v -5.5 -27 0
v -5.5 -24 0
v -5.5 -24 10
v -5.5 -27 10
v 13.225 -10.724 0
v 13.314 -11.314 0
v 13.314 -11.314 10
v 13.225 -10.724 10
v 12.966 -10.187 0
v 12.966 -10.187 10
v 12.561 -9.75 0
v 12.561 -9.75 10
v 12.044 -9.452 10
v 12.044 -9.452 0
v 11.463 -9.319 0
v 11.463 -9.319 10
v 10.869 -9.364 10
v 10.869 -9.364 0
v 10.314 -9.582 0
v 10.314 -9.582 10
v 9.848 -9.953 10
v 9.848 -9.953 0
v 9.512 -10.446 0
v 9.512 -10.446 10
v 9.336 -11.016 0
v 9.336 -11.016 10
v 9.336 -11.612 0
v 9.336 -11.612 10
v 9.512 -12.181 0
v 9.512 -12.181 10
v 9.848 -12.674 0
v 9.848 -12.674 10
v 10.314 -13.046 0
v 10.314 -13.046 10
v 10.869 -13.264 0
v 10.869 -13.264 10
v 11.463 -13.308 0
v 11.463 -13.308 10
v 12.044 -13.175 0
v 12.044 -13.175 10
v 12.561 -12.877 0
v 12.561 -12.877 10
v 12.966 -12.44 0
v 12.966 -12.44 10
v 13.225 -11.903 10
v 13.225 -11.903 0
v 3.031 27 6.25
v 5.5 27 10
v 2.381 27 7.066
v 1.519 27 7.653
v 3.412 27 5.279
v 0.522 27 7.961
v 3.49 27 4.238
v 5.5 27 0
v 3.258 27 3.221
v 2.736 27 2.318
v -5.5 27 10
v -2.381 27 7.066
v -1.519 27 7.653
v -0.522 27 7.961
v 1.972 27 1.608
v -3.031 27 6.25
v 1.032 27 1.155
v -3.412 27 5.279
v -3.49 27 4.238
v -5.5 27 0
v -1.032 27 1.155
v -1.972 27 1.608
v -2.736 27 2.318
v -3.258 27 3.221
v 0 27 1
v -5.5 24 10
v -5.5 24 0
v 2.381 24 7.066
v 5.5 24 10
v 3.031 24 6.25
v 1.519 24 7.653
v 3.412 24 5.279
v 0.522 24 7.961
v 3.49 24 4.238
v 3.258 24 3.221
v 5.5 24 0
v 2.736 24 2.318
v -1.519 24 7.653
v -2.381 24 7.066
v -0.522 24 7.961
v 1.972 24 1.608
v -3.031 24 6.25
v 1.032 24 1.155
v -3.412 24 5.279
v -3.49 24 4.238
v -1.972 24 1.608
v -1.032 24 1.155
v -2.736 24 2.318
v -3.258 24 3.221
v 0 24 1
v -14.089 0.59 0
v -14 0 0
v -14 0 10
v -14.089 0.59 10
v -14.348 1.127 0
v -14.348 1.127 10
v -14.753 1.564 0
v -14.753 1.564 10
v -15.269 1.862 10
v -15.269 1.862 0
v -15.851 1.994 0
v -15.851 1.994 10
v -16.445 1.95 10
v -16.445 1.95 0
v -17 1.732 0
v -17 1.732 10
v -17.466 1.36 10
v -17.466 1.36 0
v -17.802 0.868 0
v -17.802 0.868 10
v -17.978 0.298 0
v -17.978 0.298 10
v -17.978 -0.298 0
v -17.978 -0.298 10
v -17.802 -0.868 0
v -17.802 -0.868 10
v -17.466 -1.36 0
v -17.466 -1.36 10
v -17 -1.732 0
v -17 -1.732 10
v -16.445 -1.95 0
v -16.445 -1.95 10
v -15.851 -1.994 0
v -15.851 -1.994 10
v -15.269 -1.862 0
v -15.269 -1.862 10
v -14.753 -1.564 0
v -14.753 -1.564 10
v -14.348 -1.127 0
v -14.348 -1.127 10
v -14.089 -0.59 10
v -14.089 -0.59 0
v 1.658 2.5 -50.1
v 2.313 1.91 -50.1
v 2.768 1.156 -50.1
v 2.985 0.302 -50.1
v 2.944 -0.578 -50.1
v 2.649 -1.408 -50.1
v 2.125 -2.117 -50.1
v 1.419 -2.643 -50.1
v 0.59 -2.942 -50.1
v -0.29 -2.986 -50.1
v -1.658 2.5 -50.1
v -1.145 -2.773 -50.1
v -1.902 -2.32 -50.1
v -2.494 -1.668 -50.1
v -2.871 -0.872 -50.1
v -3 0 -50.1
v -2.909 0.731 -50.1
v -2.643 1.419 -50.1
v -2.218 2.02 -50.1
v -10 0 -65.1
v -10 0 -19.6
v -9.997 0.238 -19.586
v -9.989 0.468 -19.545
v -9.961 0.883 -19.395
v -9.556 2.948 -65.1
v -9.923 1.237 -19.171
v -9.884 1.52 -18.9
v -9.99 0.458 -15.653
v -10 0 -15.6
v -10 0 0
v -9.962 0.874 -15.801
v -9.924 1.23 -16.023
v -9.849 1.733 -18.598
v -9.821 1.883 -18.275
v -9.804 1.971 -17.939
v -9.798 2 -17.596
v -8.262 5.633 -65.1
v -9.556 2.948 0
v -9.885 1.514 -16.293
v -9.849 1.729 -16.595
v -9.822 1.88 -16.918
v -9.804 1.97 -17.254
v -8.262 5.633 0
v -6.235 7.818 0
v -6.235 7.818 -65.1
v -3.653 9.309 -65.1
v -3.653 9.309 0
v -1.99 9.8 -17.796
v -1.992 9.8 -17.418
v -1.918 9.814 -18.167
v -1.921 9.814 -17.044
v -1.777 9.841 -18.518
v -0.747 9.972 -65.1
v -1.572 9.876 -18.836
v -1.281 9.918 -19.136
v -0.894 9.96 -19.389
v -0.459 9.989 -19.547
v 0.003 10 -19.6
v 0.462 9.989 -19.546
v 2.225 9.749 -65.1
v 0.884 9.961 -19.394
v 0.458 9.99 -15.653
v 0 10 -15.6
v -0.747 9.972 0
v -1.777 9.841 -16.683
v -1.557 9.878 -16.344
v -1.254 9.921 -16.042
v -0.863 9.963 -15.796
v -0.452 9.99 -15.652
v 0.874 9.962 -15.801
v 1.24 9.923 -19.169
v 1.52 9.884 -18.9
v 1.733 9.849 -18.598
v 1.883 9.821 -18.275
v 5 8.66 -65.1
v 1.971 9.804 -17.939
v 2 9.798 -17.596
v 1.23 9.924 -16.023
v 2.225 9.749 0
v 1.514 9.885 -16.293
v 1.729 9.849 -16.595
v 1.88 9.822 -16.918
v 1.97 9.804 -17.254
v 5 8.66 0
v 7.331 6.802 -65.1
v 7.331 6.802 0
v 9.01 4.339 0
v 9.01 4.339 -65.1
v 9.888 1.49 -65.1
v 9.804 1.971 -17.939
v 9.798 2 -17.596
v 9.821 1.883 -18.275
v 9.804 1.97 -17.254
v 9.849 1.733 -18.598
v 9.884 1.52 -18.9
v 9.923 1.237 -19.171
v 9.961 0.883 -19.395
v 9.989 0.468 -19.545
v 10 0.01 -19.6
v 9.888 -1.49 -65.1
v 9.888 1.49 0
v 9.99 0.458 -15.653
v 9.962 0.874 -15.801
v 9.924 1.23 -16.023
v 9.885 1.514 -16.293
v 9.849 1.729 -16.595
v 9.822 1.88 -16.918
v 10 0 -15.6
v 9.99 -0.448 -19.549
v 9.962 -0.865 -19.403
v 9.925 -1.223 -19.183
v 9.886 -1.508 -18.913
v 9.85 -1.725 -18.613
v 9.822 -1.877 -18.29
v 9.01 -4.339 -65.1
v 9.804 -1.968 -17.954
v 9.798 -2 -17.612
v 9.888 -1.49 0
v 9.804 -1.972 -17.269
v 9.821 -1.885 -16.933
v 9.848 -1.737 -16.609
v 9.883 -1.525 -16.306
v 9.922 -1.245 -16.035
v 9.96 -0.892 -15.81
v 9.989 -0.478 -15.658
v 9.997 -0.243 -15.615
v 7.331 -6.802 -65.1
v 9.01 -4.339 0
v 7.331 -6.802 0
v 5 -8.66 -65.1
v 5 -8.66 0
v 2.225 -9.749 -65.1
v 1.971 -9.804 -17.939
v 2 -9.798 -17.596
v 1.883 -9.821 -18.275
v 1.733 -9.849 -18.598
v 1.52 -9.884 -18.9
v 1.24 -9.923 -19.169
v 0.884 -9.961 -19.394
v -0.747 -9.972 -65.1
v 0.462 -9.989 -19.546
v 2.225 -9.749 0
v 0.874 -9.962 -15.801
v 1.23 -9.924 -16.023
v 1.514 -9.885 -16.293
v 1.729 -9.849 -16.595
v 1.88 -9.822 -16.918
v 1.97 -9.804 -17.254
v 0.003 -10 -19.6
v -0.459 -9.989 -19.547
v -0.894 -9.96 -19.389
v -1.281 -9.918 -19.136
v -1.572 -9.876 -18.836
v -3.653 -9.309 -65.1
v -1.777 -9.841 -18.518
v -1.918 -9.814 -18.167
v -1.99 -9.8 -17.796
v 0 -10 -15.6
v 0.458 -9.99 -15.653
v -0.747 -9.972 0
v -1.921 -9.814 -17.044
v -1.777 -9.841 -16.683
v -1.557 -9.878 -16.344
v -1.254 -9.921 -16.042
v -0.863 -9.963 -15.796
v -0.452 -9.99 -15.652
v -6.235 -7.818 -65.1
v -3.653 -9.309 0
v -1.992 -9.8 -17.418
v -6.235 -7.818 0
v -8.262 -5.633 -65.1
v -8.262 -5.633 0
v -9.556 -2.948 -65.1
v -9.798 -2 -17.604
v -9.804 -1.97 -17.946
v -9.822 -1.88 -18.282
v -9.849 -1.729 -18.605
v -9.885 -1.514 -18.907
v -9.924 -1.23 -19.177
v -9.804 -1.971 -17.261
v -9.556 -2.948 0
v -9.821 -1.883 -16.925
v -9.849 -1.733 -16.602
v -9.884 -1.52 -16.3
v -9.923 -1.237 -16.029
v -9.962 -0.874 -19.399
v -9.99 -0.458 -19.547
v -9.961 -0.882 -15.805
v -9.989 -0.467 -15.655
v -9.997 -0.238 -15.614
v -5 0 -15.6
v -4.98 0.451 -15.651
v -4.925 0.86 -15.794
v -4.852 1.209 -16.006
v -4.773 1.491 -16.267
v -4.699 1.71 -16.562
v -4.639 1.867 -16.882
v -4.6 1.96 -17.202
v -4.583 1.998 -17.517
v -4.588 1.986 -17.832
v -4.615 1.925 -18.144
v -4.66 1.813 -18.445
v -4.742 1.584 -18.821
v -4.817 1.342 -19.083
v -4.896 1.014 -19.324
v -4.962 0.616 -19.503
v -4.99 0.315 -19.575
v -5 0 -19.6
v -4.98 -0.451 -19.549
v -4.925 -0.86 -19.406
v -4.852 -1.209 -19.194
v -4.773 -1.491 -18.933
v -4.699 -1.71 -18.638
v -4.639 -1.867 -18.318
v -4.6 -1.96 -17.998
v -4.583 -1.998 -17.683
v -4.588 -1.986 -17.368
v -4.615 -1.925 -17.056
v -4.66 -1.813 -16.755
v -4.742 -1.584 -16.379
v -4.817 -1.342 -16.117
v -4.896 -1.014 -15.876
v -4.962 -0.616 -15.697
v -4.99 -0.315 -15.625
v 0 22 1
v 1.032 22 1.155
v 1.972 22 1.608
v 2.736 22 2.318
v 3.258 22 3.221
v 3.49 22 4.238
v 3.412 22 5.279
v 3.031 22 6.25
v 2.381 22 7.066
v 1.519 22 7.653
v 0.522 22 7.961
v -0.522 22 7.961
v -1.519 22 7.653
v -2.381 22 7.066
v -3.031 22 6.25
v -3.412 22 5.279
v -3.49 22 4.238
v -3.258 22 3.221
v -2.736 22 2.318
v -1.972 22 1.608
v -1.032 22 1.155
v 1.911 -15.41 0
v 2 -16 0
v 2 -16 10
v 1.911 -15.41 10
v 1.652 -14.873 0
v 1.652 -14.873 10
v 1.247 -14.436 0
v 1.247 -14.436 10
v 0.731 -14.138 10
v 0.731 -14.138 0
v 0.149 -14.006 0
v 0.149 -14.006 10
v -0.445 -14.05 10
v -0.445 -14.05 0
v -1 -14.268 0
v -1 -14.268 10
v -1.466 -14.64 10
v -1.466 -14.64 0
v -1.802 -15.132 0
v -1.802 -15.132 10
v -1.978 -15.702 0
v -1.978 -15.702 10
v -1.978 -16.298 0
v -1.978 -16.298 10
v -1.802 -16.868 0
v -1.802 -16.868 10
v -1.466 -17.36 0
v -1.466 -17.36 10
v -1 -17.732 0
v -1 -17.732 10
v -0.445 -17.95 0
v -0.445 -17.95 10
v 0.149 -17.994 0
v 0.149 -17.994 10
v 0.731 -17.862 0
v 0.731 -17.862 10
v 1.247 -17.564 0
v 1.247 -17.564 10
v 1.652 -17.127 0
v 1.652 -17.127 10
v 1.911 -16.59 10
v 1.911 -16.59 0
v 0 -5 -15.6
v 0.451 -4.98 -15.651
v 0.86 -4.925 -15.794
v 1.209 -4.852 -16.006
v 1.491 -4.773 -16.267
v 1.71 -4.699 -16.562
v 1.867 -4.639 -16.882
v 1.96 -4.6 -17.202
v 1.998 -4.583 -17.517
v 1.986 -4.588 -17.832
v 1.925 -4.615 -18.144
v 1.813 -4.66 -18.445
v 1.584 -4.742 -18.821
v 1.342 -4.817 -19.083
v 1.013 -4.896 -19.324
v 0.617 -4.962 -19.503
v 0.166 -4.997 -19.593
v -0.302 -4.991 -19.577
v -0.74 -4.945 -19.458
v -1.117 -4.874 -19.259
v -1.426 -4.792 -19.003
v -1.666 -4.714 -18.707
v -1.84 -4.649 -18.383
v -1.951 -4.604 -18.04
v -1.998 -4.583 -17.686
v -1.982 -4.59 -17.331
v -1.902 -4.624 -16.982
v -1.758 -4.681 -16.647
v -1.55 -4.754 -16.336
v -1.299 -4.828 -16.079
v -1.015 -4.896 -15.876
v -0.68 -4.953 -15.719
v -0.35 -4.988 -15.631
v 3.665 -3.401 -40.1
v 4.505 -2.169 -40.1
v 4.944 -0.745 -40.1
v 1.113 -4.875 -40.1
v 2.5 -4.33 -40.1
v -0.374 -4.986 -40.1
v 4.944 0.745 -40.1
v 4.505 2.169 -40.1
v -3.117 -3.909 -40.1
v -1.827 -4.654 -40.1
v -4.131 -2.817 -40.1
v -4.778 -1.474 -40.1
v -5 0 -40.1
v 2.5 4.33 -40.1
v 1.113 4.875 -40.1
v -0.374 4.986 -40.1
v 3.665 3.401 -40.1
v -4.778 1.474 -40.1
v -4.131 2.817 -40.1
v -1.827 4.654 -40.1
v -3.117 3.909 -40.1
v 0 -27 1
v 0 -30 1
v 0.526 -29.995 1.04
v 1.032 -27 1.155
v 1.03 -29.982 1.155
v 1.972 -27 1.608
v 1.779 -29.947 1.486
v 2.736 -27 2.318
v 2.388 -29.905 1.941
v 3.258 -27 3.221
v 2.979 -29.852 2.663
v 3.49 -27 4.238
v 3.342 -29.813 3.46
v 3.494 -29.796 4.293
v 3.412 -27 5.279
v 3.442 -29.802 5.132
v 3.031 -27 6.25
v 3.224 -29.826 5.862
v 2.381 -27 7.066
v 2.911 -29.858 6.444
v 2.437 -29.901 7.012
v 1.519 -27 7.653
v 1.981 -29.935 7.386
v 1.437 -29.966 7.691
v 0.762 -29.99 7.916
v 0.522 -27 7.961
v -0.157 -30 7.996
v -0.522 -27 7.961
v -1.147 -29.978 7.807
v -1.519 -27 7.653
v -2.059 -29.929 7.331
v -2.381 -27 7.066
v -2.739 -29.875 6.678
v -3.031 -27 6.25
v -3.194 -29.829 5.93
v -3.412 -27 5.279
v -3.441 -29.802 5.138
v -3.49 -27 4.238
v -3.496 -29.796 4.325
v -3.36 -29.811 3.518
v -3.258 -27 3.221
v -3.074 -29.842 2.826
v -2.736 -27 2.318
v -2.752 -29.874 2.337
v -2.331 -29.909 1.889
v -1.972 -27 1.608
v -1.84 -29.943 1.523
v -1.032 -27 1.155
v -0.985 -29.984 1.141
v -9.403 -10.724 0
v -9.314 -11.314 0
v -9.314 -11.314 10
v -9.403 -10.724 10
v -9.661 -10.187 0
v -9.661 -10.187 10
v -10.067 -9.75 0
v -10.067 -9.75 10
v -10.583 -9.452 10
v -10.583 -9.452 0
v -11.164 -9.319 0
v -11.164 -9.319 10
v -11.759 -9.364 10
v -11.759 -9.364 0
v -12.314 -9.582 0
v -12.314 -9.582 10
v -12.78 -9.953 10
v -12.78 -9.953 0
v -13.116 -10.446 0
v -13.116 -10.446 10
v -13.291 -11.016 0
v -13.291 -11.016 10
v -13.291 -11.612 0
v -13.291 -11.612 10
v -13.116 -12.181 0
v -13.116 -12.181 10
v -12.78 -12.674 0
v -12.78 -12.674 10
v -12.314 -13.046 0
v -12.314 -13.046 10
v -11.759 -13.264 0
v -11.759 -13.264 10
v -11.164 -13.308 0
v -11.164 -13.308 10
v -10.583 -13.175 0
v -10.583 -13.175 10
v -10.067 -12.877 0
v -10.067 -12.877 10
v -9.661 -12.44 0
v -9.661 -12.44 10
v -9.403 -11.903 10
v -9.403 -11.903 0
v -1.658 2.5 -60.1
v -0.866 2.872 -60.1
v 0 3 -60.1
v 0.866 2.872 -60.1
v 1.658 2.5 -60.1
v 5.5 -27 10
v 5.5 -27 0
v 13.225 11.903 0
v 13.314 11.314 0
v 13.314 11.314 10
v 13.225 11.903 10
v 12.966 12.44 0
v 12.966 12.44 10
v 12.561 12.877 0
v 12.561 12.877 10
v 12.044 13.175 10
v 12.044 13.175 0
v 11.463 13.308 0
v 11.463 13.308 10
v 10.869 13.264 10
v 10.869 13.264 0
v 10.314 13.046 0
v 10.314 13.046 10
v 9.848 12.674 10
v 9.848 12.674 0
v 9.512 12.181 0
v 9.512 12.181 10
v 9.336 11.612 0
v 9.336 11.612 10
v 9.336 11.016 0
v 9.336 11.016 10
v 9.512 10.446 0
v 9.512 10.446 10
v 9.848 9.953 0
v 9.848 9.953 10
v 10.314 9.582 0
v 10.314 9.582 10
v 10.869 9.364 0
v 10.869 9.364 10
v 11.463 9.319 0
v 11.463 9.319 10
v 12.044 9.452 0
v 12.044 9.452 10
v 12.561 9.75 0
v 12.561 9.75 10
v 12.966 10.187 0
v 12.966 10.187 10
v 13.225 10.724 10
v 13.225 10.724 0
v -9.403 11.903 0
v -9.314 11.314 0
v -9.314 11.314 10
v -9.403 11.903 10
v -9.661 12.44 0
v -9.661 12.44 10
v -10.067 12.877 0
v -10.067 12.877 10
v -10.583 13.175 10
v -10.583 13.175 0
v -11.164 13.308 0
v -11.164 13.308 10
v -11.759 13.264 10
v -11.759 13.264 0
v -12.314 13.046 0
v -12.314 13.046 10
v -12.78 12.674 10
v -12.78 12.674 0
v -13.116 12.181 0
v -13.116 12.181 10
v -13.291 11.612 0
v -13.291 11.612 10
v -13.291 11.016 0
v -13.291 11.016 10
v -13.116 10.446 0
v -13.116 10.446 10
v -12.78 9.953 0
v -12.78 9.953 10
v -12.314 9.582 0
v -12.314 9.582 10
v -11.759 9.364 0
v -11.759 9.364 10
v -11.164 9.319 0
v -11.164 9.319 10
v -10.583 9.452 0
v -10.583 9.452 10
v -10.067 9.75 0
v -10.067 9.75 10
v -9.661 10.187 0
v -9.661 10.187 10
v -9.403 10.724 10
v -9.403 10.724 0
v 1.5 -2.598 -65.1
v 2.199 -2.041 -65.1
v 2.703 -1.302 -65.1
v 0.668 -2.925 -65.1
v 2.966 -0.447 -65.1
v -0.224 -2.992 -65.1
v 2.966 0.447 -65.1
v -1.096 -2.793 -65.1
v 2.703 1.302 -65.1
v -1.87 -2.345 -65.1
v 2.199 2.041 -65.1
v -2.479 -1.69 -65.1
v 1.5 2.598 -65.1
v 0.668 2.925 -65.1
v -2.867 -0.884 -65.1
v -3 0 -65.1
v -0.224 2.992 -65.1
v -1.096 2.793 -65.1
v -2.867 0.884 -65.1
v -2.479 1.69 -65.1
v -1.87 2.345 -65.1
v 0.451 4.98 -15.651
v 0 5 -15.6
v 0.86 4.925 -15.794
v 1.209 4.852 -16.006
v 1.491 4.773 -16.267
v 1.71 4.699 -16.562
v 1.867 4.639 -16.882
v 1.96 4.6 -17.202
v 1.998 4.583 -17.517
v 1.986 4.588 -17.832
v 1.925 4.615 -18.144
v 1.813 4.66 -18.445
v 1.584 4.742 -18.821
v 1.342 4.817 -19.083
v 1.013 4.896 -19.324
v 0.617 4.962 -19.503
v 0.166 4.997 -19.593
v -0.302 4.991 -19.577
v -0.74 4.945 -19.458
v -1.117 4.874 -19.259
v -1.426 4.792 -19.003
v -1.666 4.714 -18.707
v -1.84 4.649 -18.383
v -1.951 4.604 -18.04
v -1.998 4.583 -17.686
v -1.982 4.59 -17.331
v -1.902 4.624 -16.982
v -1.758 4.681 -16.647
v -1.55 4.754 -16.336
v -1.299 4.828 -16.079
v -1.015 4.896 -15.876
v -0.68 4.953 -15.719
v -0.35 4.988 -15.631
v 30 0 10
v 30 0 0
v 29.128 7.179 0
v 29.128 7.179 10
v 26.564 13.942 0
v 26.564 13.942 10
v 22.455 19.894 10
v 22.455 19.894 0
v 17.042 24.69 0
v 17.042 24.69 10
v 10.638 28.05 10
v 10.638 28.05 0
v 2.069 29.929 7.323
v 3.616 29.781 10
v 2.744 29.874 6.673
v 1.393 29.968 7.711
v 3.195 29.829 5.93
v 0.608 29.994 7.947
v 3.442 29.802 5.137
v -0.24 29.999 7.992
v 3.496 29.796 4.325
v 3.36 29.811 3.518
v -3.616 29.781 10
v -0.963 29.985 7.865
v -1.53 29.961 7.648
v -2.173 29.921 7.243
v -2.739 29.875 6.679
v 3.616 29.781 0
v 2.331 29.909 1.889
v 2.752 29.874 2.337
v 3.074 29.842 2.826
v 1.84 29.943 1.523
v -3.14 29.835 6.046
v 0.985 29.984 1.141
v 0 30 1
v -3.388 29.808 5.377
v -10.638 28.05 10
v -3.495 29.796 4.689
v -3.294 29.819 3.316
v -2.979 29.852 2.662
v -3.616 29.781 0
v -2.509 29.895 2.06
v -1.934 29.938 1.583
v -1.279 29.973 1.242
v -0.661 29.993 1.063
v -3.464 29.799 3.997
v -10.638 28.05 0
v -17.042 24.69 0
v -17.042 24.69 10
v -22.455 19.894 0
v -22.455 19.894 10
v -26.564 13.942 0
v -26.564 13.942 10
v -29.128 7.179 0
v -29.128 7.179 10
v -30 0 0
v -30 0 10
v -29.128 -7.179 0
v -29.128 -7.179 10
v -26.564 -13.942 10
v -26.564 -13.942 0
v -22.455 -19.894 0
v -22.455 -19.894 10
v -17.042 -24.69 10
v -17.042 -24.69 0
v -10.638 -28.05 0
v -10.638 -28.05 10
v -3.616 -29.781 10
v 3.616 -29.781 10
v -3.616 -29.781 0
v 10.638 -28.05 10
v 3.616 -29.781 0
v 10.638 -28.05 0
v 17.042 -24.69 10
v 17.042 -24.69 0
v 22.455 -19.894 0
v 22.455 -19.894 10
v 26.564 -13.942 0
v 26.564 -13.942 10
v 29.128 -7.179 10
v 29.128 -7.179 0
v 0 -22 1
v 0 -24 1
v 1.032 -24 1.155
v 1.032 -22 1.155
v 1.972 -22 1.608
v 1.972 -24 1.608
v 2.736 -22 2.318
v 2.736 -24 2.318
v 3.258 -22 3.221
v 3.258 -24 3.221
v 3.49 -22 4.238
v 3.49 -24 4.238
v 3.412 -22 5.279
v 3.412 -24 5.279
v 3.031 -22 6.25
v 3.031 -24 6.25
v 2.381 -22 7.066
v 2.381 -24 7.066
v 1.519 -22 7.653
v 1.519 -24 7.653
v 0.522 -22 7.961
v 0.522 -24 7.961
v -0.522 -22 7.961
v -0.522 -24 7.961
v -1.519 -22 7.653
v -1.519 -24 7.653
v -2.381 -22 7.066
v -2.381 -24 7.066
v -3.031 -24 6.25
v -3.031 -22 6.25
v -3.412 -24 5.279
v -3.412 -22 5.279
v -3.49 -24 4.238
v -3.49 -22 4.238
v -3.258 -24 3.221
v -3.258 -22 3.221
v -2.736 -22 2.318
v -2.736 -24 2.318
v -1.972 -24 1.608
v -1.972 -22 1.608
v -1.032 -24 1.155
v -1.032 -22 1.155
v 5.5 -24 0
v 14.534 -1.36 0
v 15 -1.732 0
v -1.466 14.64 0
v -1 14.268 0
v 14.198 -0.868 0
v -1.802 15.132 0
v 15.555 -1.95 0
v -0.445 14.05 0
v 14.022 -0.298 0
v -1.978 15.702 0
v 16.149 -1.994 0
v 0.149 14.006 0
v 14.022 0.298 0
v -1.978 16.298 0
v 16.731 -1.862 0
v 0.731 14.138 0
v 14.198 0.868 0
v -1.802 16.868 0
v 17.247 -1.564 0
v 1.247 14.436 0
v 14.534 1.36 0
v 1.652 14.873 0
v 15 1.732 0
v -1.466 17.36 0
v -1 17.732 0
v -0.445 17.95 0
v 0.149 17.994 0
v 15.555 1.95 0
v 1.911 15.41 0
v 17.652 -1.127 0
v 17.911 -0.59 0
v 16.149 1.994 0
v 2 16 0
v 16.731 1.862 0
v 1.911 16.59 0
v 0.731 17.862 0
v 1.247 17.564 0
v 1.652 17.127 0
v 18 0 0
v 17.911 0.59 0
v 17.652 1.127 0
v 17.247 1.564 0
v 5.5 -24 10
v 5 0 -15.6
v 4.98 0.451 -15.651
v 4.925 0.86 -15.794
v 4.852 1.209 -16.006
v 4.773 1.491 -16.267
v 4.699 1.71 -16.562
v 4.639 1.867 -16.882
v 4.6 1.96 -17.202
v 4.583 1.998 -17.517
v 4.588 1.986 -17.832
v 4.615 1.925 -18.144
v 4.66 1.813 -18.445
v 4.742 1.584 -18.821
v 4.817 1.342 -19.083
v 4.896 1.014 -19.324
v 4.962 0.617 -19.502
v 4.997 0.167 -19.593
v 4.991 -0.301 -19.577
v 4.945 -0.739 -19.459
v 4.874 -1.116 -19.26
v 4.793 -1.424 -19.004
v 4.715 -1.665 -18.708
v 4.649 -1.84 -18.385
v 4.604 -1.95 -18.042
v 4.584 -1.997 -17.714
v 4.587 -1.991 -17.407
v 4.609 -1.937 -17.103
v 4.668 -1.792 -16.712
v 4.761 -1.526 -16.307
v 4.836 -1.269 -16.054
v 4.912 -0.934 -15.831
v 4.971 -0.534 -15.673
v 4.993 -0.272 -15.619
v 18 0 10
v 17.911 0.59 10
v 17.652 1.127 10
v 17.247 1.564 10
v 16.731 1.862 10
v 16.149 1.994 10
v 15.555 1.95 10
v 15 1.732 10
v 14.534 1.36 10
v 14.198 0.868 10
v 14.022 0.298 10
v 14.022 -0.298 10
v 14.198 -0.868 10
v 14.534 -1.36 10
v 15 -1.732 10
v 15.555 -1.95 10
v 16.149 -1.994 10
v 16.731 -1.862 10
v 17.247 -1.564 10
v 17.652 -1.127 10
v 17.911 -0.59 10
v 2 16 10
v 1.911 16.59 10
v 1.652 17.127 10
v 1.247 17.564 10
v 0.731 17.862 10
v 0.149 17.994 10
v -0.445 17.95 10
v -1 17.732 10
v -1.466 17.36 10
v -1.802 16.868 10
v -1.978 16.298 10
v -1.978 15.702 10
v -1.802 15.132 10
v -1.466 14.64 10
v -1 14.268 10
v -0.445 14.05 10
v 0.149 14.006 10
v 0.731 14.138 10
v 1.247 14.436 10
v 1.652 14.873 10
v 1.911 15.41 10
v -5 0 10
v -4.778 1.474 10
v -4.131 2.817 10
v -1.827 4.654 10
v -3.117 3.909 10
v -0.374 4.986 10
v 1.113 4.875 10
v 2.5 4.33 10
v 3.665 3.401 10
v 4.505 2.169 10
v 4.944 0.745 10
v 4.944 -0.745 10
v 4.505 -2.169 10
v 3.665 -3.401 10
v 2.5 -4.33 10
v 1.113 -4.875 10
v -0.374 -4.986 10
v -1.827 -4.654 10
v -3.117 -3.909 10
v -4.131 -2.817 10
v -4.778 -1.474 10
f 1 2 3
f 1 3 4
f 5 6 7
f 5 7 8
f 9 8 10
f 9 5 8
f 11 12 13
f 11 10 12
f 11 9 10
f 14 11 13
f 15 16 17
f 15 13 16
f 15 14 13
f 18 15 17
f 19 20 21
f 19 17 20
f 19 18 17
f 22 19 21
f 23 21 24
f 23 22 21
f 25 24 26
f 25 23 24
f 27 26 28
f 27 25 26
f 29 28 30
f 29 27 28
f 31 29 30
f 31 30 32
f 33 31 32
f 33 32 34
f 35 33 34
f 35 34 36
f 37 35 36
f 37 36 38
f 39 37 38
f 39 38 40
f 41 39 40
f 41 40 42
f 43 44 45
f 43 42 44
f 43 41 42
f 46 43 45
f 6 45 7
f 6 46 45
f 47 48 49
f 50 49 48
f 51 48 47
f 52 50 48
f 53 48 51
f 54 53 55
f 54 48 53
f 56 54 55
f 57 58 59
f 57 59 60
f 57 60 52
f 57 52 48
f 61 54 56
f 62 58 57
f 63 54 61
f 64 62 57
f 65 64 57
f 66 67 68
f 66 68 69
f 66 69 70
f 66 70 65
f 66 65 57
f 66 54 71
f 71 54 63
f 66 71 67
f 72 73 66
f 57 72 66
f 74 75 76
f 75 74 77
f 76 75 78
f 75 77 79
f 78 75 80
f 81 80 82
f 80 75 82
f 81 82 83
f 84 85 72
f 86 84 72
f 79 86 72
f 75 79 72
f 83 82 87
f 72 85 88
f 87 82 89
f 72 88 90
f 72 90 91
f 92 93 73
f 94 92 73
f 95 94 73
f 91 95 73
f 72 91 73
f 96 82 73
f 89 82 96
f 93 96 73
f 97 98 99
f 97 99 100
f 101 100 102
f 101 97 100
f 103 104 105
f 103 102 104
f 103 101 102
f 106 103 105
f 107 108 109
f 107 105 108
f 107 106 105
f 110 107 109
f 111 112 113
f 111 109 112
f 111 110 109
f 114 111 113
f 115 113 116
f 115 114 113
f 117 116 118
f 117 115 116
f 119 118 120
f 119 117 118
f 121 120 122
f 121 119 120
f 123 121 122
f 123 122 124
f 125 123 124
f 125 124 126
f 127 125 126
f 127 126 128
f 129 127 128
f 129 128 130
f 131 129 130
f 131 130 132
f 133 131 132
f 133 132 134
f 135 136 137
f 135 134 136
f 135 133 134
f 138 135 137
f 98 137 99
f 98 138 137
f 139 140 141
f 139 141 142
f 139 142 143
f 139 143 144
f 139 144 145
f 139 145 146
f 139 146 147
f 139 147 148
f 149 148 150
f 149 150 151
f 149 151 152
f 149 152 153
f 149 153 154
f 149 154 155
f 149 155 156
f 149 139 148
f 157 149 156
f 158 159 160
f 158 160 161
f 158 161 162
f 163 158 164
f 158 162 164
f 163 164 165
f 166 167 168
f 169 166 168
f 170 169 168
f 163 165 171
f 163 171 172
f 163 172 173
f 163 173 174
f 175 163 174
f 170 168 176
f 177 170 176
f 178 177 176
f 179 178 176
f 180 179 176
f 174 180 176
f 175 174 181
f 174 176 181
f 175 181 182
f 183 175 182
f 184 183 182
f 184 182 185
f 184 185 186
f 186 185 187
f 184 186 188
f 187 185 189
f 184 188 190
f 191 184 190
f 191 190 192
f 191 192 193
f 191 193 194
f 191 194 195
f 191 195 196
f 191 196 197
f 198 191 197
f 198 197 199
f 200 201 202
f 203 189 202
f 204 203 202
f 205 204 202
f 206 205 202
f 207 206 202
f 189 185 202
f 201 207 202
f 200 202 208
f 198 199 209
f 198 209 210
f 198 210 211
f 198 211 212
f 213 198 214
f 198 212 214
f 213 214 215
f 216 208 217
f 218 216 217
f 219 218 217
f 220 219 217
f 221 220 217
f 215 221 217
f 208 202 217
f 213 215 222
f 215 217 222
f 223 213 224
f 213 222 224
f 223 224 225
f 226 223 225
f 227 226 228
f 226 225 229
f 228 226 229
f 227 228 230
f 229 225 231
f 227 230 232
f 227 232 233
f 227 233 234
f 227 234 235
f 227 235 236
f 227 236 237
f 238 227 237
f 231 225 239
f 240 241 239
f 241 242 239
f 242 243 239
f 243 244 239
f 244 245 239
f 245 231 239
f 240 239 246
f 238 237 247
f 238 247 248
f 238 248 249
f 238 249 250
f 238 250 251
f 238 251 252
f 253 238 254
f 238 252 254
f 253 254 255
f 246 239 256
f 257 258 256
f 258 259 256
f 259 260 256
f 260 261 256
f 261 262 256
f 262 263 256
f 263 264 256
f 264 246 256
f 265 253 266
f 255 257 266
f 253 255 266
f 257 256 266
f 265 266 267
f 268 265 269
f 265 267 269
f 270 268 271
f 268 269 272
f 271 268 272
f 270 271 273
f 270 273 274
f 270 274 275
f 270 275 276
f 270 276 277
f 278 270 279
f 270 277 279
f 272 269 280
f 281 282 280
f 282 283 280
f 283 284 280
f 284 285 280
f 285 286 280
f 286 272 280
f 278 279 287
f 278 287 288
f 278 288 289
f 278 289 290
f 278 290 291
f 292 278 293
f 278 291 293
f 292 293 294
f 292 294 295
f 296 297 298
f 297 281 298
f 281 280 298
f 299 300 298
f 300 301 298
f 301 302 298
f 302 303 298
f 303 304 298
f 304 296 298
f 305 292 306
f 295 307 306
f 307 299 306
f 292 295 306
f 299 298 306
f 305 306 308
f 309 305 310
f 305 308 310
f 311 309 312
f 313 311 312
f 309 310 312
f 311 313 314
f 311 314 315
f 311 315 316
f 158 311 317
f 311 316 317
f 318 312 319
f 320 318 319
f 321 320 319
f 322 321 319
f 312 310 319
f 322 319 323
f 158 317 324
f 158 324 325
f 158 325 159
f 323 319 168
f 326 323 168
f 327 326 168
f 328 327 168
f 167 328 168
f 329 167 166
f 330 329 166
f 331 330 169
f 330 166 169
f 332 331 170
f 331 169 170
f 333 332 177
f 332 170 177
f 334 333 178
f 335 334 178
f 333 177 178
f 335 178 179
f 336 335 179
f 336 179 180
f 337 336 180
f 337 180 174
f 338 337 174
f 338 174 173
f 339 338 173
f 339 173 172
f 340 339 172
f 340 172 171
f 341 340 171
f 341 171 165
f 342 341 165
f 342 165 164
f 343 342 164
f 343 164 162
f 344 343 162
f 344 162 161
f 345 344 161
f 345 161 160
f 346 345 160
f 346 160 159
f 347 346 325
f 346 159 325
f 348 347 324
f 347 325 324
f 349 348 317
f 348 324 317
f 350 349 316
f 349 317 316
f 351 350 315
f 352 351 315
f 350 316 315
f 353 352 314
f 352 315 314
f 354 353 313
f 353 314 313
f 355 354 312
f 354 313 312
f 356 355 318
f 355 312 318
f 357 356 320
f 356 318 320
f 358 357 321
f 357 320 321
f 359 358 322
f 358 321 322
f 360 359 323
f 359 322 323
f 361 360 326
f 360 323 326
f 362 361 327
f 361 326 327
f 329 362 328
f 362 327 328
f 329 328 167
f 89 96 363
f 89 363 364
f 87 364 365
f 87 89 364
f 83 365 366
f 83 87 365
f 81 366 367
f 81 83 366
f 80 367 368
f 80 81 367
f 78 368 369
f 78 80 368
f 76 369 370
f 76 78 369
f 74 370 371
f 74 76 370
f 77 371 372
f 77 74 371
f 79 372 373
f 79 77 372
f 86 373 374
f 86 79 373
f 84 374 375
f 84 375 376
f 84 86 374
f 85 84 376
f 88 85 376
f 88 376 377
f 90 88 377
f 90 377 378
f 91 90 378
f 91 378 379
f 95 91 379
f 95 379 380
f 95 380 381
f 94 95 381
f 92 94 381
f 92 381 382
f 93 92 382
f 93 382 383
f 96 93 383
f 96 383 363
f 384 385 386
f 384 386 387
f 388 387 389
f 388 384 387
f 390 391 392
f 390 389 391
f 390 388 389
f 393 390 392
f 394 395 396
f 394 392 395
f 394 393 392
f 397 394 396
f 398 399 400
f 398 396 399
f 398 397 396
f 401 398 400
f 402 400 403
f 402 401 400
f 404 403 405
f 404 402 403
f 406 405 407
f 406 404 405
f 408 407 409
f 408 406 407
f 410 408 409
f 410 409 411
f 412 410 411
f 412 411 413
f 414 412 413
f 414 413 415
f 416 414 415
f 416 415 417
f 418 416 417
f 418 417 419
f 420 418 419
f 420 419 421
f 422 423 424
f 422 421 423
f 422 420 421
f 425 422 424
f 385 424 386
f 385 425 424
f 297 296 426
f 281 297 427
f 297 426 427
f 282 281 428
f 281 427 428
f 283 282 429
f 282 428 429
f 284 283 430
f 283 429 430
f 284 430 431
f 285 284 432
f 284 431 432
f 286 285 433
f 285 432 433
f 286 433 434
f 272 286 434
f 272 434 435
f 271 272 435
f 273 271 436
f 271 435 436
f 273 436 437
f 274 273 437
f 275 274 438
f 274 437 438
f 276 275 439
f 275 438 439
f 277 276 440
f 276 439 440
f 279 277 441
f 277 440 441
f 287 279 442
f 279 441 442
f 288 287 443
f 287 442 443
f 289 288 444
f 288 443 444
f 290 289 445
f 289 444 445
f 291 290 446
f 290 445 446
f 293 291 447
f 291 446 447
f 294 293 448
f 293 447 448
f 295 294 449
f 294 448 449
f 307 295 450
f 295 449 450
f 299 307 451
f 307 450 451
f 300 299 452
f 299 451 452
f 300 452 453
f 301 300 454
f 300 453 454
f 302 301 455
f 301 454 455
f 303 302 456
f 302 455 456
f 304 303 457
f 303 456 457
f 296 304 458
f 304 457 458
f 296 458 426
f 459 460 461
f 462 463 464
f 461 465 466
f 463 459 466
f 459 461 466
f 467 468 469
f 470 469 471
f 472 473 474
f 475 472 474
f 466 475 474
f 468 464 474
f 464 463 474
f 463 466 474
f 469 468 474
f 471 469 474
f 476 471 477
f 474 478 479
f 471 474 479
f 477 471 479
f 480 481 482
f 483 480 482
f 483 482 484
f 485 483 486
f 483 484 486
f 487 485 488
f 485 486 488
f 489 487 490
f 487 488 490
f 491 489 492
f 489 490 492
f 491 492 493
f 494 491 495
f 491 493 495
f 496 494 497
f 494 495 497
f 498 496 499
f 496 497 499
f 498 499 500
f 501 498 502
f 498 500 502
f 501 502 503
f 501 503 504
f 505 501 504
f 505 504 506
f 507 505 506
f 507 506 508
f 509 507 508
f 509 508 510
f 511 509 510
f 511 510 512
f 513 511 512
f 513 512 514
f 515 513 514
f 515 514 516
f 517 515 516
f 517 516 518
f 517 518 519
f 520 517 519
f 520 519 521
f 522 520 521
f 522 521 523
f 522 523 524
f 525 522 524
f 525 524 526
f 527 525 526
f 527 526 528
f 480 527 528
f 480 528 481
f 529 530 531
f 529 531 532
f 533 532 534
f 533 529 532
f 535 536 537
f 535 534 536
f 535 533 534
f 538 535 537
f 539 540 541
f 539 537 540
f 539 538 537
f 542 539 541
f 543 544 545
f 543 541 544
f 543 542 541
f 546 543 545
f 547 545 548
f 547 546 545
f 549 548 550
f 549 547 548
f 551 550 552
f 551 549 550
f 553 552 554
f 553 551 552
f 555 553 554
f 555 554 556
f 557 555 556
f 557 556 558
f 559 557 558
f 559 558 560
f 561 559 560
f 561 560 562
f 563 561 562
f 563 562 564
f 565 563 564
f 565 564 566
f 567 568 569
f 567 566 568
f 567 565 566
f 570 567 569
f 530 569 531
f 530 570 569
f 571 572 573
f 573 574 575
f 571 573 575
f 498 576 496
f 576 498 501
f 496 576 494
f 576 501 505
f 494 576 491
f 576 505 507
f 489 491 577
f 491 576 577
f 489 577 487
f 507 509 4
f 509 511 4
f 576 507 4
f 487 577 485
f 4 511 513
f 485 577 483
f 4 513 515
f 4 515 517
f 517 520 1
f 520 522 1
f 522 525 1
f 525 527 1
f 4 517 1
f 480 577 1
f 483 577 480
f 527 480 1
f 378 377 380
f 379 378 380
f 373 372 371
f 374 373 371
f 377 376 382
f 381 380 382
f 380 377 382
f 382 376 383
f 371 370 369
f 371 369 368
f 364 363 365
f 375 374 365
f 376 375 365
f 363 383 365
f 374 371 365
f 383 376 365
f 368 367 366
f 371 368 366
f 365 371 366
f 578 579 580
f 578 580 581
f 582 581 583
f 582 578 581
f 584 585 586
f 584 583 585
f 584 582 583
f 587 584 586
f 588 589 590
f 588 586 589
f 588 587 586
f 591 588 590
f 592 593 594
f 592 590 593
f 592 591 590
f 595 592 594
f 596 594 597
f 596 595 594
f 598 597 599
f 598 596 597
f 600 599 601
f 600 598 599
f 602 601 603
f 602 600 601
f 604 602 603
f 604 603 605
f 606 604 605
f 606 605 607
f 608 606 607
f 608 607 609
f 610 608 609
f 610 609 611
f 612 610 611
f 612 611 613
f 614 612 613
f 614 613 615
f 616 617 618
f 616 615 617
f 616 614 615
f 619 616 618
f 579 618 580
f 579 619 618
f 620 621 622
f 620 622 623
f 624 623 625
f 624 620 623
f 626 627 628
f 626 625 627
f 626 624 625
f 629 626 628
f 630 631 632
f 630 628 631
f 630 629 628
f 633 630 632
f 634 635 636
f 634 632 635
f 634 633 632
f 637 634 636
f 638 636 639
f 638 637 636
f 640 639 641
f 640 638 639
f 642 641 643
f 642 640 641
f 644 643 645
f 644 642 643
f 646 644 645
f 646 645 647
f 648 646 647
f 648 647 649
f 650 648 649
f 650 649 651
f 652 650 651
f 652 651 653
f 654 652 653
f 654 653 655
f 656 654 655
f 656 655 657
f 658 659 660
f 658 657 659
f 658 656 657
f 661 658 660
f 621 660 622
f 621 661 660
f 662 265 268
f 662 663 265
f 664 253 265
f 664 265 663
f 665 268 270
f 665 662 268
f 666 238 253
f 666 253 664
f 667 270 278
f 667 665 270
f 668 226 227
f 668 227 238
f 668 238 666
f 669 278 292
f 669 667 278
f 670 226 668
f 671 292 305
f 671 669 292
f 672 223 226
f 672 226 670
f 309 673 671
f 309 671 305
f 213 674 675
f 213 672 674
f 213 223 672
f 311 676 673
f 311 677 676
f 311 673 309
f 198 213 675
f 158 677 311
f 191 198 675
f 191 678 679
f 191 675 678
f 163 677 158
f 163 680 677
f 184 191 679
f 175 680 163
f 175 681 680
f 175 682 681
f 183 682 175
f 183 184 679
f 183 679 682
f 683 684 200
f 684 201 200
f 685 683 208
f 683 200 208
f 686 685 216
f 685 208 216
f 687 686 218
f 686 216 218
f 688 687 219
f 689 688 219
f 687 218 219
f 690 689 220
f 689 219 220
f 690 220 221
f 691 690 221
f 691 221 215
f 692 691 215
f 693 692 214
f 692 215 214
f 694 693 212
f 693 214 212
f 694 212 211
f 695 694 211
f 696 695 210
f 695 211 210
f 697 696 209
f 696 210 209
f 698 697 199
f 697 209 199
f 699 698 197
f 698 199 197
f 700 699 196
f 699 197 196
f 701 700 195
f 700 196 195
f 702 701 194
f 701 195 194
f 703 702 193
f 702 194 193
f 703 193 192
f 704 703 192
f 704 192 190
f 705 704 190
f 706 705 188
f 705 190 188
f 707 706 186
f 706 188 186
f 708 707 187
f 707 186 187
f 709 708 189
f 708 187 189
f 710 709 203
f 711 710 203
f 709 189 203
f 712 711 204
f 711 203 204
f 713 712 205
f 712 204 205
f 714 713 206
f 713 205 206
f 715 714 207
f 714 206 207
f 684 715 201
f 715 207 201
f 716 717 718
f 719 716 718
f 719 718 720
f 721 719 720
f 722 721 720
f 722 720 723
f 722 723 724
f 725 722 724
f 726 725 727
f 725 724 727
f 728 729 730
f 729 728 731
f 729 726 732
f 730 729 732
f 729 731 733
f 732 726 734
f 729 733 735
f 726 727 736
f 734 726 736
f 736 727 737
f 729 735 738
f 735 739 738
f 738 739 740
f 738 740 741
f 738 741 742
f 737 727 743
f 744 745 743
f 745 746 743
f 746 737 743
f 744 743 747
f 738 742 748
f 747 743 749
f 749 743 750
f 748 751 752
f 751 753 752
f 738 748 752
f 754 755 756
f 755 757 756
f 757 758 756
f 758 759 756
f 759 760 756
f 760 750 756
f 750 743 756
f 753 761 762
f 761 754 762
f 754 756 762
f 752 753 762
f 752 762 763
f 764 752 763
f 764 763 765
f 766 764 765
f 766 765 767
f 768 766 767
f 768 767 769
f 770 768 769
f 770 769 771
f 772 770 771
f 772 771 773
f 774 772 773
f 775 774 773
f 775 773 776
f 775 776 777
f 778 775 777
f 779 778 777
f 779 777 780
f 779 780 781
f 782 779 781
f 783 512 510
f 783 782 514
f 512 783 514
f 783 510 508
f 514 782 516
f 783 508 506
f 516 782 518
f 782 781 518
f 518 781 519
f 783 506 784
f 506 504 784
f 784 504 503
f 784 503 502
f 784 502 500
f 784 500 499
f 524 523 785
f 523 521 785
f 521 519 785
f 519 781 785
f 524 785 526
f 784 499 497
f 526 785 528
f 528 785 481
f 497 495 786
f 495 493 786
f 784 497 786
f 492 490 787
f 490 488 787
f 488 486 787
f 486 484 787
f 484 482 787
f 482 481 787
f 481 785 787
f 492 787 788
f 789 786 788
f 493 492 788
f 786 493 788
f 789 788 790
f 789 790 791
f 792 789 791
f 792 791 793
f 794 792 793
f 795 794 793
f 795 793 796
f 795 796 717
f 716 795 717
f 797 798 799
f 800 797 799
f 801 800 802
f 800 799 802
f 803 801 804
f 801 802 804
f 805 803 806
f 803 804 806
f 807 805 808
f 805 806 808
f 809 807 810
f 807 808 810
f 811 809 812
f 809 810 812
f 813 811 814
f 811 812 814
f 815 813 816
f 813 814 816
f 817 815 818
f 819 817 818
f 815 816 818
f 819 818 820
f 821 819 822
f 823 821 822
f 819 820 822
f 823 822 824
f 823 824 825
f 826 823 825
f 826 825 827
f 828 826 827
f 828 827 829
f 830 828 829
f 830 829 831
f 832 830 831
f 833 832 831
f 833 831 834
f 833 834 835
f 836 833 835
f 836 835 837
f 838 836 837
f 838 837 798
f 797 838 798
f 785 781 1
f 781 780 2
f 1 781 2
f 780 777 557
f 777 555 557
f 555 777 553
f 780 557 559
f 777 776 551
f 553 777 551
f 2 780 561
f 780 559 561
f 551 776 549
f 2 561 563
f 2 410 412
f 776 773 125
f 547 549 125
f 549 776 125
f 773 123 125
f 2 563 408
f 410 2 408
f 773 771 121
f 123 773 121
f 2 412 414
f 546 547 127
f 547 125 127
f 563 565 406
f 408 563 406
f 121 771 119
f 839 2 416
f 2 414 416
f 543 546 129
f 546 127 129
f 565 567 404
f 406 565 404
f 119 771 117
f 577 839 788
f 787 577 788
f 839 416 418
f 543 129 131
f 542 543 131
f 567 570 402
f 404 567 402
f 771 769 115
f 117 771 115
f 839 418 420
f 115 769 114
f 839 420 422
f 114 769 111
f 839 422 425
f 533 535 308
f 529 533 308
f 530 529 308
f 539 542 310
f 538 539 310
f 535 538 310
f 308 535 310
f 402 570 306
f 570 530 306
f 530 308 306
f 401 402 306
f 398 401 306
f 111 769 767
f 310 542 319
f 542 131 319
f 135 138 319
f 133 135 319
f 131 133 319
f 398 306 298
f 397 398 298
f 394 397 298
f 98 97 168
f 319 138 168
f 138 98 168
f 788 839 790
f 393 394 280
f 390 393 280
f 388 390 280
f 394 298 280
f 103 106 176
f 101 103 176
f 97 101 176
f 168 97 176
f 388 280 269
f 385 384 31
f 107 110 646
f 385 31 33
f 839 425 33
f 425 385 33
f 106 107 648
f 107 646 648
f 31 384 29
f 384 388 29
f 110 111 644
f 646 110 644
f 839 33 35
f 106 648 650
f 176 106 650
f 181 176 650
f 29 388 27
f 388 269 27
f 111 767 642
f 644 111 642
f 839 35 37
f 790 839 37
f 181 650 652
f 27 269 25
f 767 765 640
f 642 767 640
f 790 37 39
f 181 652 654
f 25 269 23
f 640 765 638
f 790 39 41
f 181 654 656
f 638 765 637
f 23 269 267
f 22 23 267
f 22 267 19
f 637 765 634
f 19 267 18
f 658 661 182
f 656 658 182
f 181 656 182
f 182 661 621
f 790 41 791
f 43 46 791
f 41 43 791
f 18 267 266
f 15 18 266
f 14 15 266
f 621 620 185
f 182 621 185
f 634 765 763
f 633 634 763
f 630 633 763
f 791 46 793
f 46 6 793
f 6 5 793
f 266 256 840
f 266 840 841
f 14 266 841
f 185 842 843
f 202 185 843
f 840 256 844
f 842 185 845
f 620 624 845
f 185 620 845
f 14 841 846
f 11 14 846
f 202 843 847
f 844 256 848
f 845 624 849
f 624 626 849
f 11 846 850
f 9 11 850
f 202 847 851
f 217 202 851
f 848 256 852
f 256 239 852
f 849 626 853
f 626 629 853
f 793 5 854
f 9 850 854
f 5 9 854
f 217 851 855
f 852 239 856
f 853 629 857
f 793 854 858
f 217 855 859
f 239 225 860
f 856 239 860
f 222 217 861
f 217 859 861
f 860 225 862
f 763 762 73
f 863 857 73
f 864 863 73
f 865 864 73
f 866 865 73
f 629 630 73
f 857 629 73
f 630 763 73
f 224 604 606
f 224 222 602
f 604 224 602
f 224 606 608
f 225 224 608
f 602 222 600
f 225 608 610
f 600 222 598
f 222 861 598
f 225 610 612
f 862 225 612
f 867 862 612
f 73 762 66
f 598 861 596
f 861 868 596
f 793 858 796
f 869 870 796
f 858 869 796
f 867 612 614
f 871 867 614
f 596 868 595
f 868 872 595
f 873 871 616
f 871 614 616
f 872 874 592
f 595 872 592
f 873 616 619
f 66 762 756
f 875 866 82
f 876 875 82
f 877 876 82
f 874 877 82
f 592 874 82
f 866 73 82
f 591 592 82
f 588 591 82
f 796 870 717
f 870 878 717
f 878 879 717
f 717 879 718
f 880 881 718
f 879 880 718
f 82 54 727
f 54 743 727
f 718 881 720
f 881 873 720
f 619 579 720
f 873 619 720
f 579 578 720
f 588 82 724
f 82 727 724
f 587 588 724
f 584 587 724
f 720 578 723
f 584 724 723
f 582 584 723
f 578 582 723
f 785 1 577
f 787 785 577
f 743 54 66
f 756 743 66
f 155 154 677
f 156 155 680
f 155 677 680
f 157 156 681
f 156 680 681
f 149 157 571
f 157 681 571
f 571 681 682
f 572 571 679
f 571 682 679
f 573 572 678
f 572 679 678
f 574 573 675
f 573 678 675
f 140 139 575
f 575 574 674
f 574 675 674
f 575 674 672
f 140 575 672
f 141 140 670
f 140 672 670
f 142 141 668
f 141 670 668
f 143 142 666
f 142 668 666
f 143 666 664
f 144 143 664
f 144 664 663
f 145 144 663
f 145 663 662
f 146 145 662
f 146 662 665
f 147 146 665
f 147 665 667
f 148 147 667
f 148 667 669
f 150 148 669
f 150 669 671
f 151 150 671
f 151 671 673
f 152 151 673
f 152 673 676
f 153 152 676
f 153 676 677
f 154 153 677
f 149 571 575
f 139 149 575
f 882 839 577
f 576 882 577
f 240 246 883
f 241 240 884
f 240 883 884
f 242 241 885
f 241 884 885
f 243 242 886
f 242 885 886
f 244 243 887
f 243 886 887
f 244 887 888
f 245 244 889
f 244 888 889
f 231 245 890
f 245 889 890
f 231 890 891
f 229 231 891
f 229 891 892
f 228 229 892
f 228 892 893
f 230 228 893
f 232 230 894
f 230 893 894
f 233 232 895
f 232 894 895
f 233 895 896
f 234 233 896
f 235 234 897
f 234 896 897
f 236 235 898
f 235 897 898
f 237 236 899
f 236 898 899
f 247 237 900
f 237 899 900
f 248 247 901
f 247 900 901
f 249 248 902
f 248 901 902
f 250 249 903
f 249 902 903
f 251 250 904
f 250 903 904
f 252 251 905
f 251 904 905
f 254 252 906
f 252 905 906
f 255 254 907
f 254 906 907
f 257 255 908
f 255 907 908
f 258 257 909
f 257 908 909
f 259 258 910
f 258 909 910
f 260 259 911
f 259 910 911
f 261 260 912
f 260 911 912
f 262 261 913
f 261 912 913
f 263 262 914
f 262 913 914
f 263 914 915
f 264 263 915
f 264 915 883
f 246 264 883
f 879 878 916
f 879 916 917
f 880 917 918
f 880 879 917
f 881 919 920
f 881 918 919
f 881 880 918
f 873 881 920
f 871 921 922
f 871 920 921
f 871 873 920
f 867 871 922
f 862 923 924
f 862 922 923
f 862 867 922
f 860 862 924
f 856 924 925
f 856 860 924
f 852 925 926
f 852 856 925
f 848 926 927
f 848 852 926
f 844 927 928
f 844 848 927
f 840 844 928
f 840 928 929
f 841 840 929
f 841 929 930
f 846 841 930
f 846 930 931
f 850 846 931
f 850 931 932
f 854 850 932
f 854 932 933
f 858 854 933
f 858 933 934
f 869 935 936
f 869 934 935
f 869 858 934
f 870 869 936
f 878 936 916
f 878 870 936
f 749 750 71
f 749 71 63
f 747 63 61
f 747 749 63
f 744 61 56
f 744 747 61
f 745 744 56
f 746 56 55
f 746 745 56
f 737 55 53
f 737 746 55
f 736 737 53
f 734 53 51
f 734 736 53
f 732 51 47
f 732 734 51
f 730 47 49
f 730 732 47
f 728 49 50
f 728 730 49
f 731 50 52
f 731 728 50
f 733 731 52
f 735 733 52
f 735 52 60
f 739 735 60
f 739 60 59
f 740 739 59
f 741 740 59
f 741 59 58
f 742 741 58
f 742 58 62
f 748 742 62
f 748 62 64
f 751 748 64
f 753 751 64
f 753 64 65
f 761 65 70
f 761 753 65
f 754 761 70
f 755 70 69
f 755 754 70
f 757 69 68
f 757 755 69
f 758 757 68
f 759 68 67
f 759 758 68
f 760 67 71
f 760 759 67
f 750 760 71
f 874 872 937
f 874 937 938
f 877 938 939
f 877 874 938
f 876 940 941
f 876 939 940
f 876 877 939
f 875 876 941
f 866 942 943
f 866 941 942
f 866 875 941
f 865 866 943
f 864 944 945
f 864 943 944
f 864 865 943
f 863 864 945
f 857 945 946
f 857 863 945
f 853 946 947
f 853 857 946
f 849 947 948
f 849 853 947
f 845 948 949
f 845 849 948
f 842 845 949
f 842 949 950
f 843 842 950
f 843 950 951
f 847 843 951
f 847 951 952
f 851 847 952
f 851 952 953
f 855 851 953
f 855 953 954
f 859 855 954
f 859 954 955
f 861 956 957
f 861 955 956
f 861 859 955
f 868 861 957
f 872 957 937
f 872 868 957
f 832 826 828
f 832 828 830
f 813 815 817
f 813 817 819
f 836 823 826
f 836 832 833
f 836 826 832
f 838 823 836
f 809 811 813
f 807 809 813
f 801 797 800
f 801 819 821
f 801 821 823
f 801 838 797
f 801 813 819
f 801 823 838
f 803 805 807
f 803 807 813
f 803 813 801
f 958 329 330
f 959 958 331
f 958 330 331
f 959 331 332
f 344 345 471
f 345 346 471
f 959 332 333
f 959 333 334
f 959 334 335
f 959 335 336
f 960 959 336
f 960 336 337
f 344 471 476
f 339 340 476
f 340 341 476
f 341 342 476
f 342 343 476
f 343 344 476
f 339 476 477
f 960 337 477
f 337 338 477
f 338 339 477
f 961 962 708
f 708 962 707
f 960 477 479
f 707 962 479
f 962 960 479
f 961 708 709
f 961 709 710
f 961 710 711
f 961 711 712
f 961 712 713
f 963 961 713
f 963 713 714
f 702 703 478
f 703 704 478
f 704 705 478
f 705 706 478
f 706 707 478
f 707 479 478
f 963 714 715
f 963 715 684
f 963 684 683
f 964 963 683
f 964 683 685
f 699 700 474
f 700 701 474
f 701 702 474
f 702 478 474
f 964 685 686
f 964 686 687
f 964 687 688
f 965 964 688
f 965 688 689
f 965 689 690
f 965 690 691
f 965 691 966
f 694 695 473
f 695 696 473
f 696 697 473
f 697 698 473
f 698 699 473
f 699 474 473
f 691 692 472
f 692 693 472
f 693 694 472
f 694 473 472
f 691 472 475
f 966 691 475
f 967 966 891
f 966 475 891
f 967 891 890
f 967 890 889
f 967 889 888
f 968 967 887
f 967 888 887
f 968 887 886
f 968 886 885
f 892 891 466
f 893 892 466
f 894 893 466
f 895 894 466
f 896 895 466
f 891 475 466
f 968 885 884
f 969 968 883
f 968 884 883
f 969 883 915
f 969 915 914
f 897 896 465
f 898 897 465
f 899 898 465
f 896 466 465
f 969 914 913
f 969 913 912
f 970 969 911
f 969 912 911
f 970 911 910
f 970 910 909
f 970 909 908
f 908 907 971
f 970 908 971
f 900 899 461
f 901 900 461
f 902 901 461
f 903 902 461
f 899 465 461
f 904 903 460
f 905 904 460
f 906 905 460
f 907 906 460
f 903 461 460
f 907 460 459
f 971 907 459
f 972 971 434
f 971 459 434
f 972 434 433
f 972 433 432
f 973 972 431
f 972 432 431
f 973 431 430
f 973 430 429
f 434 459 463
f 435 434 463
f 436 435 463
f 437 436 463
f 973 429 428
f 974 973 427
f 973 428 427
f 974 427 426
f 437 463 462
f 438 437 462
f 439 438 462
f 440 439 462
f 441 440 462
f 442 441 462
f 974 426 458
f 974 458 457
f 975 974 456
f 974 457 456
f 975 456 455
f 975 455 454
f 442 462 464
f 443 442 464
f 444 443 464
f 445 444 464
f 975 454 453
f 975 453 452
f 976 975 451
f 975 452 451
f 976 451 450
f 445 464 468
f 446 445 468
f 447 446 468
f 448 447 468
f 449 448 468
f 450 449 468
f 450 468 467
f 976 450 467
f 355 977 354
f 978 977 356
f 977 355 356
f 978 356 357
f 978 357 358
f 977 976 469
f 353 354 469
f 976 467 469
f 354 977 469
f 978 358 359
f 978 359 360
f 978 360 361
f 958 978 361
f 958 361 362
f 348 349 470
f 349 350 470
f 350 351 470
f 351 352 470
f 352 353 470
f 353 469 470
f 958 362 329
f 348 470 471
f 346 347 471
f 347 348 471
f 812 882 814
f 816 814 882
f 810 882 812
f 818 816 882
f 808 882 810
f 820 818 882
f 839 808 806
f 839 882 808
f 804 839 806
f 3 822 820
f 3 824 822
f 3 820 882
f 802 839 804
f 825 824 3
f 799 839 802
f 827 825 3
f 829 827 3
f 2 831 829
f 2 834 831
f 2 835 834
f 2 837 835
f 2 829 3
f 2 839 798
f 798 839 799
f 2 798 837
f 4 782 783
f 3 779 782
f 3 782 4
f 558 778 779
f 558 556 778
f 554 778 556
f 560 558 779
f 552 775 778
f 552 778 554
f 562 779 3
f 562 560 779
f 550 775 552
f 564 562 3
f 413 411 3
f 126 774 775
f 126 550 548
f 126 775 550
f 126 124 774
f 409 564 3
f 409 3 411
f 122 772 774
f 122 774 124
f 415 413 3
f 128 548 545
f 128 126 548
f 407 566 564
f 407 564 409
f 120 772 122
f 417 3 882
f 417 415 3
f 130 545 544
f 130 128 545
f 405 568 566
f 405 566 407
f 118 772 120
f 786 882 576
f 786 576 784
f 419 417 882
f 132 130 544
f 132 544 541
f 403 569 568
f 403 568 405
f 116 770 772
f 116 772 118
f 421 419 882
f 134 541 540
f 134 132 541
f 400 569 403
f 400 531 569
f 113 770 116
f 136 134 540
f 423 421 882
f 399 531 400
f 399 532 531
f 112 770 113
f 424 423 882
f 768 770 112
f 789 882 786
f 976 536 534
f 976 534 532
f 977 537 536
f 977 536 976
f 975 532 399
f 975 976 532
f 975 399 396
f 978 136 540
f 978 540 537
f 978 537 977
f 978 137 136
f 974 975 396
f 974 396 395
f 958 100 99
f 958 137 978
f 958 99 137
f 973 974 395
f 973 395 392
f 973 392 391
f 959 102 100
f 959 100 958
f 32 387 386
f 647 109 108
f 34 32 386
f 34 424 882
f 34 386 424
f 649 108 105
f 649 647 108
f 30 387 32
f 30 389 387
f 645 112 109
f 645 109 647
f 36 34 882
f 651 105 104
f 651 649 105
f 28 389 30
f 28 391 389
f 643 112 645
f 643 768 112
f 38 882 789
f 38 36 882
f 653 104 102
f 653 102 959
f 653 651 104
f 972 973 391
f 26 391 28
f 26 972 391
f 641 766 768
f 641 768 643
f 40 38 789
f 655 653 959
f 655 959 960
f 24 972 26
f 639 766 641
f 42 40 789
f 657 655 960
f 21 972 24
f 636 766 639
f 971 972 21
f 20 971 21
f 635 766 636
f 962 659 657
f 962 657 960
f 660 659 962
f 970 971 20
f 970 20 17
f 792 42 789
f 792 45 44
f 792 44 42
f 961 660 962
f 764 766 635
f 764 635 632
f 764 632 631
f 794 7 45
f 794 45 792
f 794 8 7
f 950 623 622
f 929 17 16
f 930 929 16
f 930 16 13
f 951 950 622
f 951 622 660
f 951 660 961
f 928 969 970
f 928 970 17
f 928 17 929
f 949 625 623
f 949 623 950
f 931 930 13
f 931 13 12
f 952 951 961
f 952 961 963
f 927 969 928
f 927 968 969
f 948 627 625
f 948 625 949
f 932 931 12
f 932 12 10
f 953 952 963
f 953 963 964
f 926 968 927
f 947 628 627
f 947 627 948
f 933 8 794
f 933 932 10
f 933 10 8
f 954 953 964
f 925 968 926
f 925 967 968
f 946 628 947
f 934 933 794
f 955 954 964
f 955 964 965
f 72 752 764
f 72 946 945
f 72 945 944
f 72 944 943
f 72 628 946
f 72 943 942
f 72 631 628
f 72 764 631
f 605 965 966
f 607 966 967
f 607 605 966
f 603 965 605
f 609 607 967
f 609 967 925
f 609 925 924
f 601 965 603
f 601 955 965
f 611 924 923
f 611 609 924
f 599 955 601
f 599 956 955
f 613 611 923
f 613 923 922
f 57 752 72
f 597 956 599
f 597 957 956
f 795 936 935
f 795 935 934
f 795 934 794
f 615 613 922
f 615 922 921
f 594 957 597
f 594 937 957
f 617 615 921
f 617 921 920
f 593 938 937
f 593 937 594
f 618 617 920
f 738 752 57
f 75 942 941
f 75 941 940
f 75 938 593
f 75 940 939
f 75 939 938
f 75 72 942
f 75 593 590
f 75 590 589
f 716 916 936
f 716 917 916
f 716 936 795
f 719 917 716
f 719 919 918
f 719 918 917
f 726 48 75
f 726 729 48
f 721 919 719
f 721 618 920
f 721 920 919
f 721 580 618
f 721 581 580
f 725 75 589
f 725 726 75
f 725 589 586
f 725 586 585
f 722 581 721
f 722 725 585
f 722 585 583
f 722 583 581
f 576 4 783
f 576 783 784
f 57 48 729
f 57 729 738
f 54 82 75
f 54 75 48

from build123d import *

# Parameters (mm, degrees)
SKETCH1_R               = 30
BOSS_EXTRUDE1_DEPTH     = 10
SKETCH2_R               = 10
BOSS_EXTRUDE2_DEPTH     = 65.1
SKETCH2_2_R             = 10
BOSS_EXTRUDE3_DEPTH     = 20
SKETCH5_R               = 5
CUT_EXTRUDE1_DEPTH      = 87.255492579
SKETCH6_R               = 2
CUT_EXTRUDE2_DEPTH      = 78.704633067
CIRPATTERN1_COUNT       = 2
CIRPATTERN1_ANGLE       = 90
CUT_EXTRUDE3_DEPTH      = 87.255492666
CUT_EXTRUDE3_DEPTH_BACK = 87.255492666
SKETCH7_R               = 2
SKETCH9_W               = 11
SKETCH9_H               = 3
CUT_EXTRUDE5_DEPTH      = 10
SKETCH10_R              = 3.5
CUT_EXTRUDE6_DEPTH      = 8
SKETCH17_R              = 7.355644599
BOSS_EXTRUDE4_DEPTH     = 25
SKETCH18_R              = 3
CUT_EXTRUDE7_DEPTH      = 15
BOSS_EXTRUDE5_START     = 10
BOSS_EXTRUDE5_DEPTH     = 10


with BuildPart() as part:
    # Sketch1 → Boss-Extrude1 (new body)
    with BuildSketch(Plane.XY):
        Circle(SKETCH1_R)
    extrude(amount=BOSS_EXTRUDE1_DEPTH)

    # Sketch2 → Boss-Extrude2 (add)
    with BuildSketch(Plane(origin=(0, 0, 0), x_dir=(-1, 0, 0), z_dir=(0, 0, -1))):
        Circle(SKETCH2_R)
    extrude(amount=BOSS_EXTRUDE2_DEPTH)

    # Sketch2<2> → Boss-Extrude3 (add)
    with BuildSketch(Plane(origin=(0, 0, 0), x_dir=(-1, 0, 0), z_dir=(0, 0, -1))):
        Circle(SKETCH2_2_R)
    extrude(amount=BOSS_EXTRUDE3_DEPTH)

    # Sketch5 → Cut-Extrude1 (cut, through all)
    with BuildSketch(Plane(origin=(0, 0, -65.1), x_dir=(-1, 0, 0), z_dir=(0, 0, -1))):
        Circle(SKETCH5_R)
    extrude(amount=-CUT_EXTRUDE1_DEPTH, mode=Mode.SUBTRACT)

    # Sketch6 → Cut-Extrude2 (cut, symmetric)
    with BuildSketch(Plane(origin=(0, 0, 0), x_dir=(1, 0, 0), z_dir=(0, 1, 0))):
        with Locations((0, 17.6)):
            Circle(SKETCH6_R)
    cut_extrude2 = extrude(amount=CUT_EXTRUDE2_DEPTH, both=True, mode=Mode.SUBTRACT)

    # CirPattern1: Cut-Extrude2 ×2 about axis
    cirpattern1_axis = Axis((0, 0, -65.1), (0, 0, 1))
    for i in range(1, CIRPATTERN1_COUNT):
        add(cut_extrude2.rotate(cirpattern1_axis, i * CIRPATTERN1_ANGLE / (CIRPATTERN1_COUNT - 1)), mode=Mode.SUBTRACT)

    # Sketch7 → Cut-Extrude3 (cut, two sides: drawn at the far end of the back side and taken through both)
    with BuildSketch(Plane.XY.offset(10).offset(-CUT_EXTRUDE3_DEPTH_BACK)):
        with Locations((0, 16)):
            Circle(SKETCH7_R)
        with Locations((11.313708499, 11.313708499)):
            Circle(SKETCH7_R)
        with Locations((16, 0)):
            Circle(SKETCH7_R)
        with Locations((11.313708499, -11.313708499)):
            Circle(SKETCH7_R)
        with Locations((0, -16)):
            Circle(SKETCH7_R)
        with Locations((-11.313708499, -11.313708499)):
            Circle(SKETCH7_R)
        with Locations((-16, 0)):
            Circle(SKETCH7_R)
        with Locations((-11.313708499, 11.313708499)):
            Circle(SKETCH7_R)
    extrude(amount=CUT_EXTRUDE3_DEPTH + CUT_EXTRUDE3_DEPTH_BACK, mode=Mode.SUBTRACT)

    # Sketch9 → Cut-Extrude5 (cut)
    with BuildSketch(Plane(origin=(0, 0, 0), x_dir=(-1, 0, 0), z_dir=(0, 0, -1))):
        with Locations((0, 25.5)):
            Rectangle(SKETCH9_W, SKETCH9_H)
    cut_extrude5 = extrude(amount=-CUT_EXTRUDE5_DEPTH, mode=Mode.SUBTRACT)

    # Mirror1: Cut-Extrude5 across plane
    add(cut_extrude5.mirror(Plane.ZX), mode=Mode.SUBTRACT)

    # Sketch10 → Cut-Extrude6 (cut)
    with BuildSketch(Plane(origin=(0, -30, 0), x_dir=(-1, 0, 0), z_dir=(0, -1, 0))):
        with Locations((0, -4.5)):
            Circle(SKETCH10_R)
    cut_extrude6 = extrude(amount=-CUT_EXTRUDE6_DEPTH, mode=Mode.SUBTRACT)

    # Mirror2: Cut-Extrude6 across plane
    add(cut_extrude6.mirror(Plane.ZX), mode=Mode.SUBTRACT)

    # Sketch17 → Boss-Extrude4 (add)
    with BuildSketch(Plane(origin=(0, 0, -40.1), x_dir=(-1, 0, 0), z_dir=(0, 0, -1))):
        Circle(SKETCH17_R)
    extrude(amount=BOSS_EXTRUDE4_DEPTH)

    # Sketch18 → Cut-Extrude7 (cut)
    with BuildSketch(Plane(origin=(0, 0, -65.1), x_dir=(-1, 0, 0), z_dir=(0, 0, -1))):
        Circle(SKETCH18_R)
    extrude(amount=-CUT_EXTRUDE7_DEPTH, mode=Mode.SUBTRACT)

    # Sketch19 → Boss-Extrude5 (add)
    with BuildSketch(Plane(origin=(0, 0, -50.1), x_dir=(-1, 0, 0), z_dir=(0, 0, -1)).offset(BOSS_EXTRUDE5_START)):
        with BuildLine():
            Line((1.658312395, 2.5), (-1.658312395, 2.5))
            ThreePointArc((-1.658312395, 2.5), (0, 3), (1.658312395, 2.5))
        make_face()
    extrude(amount=-BOSS_EXTRUDE5_DEPTH)


solid = part.part
